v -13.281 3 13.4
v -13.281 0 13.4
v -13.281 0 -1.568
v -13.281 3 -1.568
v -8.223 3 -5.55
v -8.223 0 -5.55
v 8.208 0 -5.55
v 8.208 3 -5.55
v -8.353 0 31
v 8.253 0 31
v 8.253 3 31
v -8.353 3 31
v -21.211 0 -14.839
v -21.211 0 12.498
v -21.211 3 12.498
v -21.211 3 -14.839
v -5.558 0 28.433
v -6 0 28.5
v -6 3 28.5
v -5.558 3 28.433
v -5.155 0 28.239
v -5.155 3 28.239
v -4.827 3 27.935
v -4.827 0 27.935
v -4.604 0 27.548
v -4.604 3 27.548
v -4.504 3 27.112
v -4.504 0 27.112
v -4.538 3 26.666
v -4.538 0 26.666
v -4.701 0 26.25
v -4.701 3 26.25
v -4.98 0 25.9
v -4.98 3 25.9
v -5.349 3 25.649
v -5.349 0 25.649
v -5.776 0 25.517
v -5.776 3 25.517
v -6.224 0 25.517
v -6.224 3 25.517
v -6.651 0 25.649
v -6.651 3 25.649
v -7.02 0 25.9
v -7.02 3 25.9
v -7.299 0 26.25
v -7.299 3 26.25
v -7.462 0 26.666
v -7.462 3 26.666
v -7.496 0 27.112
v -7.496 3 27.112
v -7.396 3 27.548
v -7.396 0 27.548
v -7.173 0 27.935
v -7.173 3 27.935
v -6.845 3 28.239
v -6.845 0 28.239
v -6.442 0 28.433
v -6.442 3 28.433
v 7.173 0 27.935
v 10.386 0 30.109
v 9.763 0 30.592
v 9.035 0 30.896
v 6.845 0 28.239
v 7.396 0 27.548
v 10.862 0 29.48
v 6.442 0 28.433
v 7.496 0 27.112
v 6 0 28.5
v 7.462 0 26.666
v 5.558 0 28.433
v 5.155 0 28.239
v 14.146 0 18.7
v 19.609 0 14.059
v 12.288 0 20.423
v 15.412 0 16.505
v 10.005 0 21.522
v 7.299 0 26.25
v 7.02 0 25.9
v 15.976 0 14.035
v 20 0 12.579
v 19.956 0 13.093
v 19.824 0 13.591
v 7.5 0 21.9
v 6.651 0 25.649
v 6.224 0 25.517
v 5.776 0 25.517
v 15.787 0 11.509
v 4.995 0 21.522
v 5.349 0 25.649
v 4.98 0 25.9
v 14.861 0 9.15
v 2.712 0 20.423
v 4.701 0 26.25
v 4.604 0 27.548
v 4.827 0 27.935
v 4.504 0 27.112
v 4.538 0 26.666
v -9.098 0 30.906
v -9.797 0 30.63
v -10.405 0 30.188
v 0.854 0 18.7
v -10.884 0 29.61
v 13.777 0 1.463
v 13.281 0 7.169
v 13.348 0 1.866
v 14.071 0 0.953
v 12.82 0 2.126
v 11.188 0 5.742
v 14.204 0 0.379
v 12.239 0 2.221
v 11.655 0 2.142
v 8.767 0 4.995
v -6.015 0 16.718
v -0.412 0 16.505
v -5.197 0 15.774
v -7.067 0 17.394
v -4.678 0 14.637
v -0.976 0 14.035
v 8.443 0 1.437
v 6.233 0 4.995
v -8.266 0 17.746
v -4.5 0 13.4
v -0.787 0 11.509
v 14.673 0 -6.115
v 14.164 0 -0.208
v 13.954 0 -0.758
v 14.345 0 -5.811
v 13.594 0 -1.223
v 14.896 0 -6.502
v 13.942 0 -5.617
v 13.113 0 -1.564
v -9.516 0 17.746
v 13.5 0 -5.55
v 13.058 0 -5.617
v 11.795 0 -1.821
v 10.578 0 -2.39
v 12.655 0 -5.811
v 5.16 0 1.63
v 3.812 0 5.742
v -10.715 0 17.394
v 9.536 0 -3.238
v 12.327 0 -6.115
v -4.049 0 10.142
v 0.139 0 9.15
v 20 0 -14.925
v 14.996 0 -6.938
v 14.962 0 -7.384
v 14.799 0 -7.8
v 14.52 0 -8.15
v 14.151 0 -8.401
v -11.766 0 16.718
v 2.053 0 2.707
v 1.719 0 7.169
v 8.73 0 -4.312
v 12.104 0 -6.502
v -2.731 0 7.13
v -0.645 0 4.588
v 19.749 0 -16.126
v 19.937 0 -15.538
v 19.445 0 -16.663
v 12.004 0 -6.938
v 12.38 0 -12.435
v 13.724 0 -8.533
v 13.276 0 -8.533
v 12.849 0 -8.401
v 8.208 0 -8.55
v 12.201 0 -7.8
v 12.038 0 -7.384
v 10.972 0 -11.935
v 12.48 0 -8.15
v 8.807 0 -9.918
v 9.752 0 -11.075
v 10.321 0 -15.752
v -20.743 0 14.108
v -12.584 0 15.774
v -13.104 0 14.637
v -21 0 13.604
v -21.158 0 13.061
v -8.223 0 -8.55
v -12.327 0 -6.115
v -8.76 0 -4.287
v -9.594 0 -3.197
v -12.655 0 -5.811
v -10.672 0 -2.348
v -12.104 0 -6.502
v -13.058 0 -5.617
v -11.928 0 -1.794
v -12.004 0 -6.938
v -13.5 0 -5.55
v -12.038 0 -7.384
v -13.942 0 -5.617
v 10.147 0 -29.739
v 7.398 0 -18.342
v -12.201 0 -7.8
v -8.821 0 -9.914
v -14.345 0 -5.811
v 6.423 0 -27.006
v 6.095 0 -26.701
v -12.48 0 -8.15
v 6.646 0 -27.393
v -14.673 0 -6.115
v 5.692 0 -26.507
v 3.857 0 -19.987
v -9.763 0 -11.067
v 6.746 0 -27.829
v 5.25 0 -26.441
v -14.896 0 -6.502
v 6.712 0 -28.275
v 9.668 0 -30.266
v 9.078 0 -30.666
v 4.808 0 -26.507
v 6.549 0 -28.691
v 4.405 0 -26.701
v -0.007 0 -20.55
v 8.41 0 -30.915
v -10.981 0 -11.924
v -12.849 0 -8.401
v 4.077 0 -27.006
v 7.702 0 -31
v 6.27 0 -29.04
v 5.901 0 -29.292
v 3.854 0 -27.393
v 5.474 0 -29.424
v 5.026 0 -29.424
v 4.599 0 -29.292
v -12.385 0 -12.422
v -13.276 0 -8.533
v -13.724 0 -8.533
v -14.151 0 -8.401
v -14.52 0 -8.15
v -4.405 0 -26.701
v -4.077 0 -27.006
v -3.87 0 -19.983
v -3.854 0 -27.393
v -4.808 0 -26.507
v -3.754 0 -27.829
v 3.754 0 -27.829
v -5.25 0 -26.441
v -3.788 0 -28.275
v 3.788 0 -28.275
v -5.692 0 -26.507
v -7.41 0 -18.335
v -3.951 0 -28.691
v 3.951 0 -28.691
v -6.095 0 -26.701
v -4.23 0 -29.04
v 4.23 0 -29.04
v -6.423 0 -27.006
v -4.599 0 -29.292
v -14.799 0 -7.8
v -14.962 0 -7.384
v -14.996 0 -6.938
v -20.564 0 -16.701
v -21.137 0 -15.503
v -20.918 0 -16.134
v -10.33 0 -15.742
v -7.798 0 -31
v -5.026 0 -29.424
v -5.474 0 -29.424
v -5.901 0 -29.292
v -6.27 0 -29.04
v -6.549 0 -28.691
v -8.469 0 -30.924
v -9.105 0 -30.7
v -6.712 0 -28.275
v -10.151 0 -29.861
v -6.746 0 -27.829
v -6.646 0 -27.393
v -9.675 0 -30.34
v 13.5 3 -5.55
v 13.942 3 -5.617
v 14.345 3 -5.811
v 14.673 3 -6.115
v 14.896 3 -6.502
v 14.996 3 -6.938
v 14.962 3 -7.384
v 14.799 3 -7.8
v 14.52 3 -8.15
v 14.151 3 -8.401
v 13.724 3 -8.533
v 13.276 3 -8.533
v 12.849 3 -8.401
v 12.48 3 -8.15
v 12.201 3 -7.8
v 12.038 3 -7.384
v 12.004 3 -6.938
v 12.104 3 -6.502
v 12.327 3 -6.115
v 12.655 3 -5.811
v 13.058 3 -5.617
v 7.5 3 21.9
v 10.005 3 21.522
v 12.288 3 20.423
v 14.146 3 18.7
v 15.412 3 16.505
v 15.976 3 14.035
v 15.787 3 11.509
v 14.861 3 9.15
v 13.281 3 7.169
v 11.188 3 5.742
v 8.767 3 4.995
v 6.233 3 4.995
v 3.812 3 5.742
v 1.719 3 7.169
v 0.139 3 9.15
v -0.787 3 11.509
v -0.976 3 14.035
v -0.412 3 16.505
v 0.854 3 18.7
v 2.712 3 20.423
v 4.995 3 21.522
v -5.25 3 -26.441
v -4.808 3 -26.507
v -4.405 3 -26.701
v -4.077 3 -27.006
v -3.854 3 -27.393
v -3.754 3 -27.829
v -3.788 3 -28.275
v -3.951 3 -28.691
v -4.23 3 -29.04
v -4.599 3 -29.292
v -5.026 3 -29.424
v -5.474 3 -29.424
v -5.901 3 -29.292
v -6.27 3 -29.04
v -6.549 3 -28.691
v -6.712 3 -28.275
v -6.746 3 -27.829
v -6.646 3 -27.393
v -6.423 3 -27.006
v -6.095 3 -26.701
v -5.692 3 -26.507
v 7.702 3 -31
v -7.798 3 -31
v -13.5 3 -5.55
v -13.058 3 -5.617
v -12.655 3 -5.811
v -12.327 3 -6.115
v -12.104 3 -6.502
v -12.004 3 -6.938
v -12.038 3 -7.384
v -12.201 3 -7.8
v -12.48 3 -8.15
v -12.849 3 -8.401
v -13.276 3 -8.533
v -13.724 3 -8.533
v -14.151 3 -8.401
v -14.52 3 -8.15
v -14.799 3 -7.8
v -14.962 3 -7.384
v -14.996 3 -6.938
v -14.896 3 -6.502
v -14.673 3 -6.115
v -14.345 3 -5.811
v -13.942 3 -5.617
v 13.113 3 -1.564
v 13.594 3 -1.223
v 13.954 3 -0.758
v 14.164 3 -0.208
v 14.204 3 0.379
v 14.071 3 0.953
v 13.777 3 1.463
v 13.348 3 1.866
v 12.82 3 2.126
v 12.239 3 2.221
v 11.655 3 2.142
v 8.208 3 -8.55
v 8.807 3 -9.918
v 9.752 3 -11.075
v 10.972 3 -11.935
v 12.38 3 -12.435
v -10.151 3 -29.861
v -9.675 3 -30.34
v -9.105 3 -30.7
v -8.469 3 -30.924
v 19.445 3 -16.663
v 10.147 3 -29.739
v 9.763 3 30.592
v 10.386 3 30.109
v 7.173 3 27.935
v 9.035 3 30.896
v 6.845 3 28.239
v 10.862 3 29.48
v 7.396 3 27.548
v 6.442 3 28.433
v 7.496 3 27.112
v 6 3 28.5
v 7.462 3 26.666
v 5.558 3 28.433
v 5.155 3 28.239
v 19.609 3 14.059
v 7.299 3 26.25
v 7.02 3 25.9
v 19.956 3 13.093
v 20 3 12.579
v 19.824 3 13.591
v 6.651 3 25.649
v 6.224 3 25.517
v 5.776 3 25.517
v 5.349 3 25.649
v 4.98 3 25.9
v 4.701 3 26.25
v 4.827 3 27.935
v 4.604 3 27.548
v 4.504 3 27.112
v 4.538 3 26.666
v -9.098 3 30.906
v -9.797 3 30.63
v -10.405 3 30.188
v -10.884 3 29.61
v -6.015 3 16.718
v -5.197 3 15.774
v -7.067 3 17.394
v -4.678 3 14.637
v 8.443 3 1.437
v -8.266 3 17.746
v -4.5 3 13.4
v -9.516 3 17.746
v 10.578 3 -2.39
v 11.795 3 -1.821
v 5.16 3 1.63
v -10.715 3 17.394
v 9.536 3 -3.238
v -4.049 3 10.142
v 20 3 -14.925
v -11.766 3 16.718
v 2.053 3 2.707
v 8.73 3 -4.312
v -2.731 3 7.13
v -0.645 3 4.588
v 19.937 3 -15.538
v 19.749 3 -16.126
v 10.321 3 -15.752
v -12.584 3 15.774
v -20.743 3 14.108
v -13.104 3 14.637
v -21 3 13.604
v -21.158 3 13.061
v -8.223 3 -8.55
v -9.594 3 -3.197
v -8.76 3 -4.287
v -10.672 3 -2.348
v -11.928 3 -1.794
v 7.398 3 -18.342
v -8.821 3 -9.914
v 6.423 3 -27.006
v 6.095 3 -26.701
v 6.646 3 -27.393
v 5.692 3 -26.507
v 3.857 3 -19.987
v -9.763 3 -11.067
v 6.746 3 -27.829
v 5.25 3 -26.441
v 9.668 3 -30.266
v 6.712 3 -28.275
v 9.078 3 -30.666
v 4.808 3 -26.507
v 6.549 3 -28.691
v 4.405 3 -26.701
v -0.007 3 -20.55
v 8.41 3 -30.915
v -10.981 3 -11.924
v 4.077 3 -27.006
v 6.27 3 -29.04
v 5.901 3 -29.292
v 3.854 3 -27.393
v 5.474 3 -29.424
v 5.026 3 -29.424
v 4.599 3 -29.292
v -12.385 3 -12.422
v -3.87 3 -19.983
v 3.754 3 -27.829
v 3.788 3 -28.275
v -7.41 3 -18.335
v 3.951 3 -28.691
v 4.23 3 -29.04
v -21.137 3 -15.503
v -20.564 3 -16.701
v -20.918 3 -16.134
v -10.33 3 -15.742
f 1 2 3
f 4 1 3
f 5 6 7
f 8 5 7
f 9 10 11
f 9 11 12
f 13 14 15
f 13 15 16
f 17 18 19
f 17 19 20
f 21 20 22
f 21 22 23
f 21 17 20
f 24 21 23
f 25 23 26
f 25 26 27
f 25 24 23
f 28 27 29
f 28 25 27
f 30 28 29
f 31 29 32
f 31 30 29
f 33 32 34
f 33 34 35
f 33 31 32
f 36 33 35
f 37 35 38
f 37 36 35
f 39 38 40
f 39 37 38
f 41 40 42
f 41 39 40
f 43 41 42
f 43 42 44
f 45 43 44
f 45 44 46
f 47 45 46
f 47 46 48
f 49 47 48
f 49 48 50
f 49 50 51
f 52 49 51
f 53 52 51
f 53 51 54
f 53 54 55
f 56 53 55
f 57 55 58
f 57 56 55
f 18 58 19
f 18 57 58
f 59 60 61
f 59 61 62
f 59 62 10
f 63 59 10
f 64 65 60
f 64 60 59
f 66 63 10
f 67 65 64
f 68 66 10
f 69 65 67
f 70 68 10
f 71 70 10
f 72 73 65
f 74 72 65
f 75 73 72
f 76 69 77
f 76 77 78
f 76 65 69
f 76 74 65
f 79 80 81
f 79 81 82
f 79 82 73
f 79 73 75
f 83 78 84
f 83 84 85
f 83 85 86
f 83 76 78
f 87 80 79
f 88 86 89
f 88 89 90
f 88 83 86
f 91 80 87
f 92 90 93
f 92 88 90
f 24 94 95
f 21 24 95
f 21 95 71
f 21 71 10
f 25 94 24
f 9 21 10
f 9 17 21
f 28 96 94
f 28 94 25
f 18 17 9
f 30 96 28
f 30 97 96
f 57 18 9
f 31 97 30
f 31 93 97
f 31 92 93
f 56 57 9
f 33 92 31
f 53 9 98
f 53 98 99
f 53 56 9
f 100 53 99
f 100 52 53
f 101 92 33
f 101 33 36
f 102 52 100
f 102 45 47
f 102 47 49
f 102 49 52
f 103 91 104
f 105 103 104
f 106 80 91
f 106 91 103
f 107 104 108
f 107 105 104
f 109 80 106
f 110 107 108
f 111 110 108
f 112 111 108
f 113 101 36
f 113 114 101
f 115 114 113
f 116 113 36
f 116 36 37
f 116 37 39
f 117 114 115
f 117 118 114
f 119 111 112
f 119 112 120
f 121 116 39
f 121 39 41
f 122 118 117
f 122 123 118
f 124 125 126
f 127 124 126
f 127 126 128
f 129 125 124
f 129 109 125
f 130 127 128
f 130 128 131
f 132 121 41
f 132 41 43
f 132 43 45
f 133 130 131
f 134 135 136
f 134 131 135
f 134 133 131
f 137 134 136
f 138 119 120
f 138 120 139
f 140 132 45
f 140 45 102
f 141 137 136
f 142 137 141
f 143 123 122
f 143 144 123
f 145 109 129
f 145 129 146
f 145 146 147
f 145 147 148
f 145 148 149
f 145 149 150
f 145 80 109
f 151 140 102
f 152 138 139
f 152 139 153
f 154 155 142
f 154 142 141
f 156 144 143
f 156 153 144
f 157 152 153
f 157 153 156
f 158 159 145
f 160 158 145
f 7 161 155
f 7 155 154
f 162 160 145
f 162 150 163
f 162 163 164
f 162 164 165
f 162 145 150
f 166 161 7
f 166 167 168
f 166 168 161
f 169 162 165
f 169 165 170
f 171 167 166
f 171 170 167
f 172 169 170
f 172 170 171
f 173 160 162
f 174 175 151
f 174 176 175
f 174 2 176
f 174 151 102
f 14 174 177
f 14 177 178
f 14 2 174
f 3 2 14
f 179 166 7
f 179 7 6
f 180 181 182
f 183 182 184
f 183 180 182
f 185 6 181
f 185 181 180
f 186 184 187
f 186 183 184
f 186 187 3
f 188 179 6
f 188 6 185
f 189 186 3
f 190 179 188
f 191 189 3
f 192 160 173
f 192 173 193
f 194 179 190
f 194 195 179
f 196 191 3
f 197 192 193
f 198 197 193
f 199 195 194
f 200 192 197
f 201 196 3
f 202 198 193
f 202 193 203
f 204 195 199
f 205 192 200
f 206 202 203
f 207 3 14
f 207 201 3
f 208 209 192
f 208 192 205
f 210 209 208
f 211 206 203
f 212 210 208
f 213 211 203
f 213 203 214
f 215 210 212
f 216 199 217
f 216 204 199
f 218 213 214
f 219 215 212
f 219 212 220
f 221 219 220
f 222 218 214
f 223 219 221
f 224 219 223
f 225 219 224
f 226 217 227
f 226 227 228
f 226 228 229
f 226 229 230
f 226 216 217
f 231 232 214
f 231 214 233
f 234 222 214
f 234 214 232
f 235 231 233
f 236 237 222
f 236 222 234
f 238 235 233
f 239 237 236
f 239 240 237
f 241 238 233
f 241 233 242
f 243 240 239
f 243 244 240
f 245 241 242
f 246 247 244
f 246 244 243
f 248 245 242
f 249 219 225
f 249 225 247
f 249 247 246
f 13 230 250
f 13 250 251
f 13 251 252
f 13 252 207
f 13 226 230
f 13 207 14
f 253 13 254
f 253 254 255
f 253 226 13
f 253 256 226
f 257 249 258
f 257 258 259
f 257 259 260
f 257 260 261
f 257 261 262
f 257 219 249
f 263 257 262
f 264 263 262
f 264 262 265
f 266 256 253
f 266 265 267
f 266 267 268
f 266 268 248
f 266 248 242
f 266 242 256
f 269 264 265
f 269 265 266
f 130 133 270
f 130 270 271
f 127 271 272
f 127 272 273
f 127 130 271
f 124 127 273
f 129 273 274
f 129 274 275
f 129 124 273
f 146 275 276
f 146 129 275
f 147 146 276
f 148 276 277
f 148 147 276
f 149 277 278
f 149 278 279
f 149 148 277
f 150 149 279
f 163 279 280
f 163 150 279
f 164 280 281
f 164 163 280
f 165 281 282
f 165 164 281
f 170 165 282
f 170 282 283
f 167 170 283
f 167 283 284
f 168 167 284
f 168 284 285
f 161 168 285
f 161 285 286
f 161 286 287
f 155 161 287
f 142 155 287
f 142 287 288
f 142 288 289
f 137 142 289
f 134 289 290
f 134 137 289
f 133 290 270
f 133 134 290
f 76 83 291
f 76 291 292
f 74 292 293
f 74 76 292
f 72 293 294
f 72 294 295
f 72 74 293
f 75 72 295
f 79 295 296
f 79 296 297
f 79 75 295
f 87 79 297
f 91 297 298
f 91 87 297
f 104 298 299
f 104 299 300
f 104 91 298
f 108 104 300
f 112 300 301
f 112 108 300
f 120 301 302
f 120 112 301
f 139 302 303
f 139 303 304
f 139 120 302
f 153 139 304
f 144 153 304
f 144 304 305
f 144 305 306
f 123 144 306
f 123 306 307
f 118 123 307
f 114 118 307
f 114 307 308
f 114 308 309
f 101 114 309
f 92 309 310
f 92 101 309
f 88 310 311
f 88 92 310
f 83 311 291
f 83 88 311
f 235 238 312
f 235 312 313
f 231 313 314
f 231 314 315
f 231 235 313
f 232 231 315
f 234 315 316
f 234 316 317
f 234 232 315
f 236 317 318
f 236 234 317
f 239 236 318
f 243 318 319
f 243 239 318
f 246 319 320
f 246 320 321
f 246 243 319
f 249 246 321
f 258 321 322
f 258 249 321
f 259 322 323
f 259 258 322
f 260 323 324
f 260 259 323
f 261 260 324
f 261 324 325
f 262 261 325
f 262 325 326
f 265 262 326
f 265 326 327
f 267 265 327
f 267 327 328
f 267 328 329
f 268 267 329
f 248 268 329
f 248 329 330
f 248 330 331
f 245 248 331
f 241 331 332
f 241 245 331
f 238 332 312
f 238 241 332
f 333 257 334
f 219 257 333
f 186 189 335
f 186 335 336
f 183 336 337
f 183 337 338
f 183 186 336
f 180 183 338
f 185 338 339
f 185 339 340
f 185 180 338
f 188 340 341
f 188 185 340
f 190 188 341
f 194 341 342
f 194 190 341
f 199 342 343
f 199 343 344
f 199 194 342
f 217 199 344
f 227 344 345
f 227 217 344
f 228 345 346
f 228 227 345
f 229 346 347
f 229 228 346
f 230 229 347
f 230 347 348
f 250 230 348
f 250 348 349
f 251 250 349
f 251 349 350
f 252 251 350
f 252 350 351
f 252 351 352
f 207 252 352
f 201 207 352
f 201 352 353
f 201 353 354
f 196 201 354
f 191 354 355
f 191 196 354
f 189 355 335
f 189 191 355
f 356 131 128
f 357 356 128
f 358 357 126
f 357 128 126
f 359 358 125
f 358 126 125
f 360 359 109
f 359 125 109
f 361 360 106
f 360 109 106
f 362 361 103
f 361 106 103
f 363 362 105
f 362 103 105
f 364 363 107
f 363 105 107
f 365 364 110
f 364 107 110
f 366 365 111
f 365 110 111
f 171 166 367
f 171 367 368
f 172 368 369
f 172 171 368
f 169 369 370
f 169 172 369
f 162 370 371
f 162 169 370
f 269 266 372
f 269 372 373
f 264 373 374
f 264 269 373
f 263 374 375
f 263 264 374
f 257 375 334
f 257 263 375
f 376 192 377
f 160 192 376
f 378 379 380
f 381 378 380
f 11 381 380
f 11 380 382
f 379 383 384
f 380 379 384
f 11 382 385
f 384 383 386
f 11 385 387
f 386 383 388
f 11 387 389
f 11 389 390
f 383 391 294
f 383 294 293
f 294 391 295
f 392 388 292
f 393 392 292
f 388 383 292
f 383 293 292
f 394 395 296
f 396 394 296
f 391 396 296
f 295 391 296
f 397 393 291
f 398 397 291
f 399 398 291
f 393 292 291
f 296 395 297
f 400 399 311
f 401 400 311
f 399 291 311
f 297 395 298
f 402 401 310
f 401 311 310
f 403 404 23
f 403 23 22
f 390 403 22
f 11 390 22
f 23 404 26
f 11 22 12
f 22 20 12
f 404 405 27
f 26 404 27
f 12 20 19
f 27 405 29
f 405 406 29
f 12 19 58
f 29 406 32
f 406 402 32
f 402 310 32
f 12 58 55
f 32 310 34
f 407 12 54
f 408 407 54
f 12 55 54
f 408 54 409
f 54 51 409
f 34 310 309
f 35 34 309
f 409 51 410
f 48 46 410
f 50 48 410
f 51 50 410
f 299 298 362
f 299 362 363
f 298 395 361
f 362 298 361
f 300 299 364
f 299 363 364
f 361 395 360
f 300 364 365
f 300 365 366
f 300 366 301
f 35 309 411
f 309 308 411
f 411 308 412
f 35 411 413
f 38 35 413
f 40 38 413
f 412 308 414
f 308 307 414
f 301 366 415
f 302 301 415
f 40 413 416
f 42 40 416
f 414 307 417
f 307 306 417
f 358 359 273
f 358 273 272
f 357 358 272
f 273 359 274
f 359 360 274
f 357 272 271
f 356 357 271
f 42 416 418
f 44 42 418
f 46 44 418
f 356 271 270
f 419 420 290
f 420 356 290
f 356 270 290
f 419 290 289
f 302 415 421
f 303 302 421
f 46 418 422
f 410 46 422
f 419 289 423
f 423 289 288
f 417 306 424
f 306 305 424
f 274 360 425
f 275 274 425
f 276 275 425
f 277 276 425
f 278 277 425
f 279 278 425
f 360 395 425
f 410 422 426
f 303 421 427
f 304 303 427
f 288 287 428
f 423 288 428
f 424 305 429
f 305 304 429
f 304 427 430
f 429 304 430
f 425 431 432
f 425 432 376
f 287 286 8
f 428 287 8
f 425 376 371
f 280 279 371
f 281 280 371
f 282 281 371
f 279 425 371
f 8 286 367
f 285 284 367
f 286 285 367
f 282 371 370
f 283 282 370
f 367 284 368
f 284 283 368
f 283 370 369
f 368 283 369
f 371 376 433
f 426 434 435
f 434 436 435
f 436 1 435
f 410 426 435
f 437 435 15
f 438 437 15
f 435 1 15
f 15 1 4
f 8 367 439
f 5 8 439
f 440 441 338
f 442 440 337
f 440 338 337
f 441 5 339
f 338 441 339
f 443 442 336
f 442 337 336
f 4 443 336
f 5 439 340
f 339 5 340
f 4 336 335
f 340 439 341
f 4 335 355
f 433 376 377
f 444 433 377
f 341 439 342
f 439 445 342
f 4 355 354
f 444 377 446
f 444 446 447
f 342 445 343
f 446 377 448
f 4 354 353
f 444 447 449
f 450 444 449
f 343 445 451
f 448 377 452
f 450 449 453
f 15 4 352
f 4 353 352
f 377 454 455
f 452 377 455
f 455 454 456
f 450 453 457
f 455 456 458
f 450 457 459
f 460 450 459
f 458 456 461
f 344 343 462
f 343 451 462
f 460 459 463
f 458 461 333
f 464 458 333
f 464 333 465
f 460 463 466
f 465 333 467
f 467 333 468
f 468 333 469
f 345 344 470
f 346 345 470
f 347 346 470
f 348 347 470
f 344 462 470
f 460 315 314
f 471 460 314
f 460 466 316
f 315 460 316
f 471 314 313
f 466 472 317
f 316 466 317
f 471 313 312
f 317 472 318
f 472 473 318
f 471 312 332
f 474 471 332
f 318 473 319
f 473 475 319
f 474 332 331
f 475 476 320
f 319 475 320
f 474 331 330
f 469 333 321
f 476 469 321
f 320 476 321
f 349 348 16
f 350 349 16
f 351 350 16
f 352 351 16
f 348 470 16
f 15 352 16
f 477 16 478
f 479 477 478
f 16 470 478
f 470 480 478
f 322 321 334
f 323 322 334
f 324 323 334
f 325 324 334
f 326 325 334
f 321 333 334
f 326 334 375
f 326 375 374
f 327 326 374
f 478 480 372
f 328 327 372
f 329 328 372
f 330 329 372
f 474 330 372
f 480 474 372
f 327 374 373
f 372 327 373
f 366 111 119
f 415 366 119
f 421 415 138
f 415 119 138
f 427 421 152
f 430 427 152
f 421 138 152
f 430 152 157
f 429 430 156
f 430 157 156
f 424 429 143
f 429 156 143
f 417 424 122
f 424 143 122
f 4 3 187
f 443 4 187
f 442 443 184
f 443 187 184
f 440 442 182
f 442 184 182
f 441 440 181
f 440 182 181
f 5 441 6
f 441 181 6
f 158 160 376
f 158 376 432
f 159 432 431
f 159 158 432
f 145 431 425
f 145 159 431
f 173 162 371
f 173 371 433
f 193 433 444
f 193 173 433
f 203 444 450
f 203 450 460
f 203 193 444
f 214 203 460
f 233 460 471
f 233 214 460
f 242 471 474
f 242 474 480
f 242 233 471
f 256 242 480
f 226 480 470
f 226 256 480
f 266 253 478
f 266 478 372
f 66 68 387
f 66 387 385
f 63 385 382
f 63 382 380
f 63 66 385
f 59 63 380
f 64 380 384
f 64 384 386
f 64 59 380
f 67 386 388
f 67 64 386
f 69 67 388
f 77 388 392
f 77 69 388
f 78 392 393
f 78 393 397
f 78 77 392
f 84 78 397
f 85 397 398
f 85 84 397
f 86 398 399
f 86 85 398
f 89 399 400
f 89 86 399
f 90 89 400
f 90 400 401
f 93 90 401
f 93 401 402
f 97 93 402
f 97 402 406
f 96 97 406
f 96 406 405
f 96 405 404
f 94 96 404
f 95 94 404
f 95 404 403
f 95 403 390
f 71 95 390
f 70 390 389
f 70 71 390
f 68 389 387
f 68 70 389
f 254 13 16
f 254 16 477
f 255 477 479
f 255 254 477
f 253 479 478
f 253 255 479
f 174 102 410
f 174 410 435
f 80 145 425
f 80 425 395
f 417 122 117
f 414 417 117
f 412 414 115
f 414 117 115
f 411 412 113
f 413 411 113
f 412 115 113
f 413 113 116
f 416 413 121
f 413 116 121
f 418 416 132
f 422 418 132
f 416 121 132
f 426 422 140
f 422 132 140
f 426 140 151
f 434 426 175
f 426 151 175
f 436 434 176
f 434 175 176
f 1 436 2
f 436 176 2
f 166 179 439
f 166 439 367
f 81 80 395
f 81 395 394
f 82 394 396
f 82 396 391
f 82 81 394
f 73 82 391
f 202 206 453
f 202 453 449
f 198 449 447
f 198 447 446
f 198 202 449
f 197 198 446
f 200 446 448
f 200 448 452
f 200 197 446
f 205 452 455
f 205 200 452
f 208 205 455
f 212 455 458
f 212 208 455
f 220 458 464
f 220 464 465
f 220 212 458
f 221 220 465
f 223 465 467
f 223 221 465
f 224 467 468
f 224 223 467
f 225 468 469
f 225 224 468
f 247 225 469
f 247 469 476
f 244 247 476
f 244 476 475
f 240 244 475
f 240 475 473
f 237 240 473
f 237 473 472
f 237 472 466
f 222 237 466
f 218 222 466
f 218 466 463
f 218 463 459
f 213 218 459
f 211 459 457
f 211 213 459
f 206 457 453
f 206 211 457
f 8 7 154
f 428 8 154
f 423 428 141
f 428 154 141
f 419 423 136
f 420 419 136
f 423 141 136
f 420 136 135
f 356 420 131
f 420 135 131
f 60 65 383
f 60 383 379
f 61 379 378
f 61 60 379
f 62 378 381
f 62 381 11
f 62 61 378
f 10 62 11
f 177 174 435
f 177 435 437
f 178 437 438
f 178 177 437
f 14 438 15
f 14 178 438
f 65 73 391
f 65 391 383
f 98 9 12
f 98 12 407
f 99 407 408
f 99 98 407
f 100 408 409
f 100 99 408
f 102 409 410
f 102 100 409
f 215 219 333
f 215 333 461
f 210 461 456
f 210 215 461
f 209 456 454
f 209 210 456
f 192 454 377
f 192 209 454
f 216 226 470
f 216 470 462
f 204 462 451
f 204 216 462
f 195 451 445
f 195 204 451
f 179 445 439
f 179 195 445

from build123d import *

# Parameters (mm, degrees)
SKETCH1_R          = 8.5
SKETCH1_R_2        = 1.5
BASE_FLANGE1_DEPTH = 3


# Sheet-metal steps are written as plain solids
with BuildPart() as part:
    # Sketch1 → Base-Flange1 (new body)
    with BuildSketch(Plane(origin=(0, 0, 0), x_dir=(1, 0, 0), z_dir=(0, 1, 0))):
        with BuildLine():
            Line((19.609421573, -14.059417906), (10.862109445, -29.480175346))
            ThreePointArc((10.862109445, -29.480175346), (9.762567662, -30.59234701), (8.252687872, -31))
            Line((8.252687872, -31), (-8.352599575, -31))
            ThreePointArc((-8.352599575, -31), (-9.796606082, -30.629609326), (-10.884048227, -29.609896806))
            Line((-10.884048227, -29.609896806), (-20.742852548, -14.107625594))
            ThreePointArc((-20.742852548, -14.107625594), (-21.091885276, -13.336076582), (-21.211403896, -12.497728788))
            Line((-21.211403896, -12.497728788), (-21.211403896, 14.839305313))
            ThreePointArc((-21.211403896, 14.839305313), (-21.044943633, 15.824725306), (-20.564035521, 16.700789784))
            Line((-20.564035521, 16.700789784), (-10.150833328, 29.861484472))
            ThreePointArc((-10.150833328, 29.861484472), (-9.105019706, 30.700412322), (-7.798201703, 31))
            Line((-7.798201703, 31), (7.702138241, 31))
            ThreePointArc((7.702138241, 31), (9.077698333, 30.666052219), (10.147014932, 29.738556288))
            Line((10.147014932, 29.738556288), (19.444876691, 16.663267527))
            ThreePointArc((19.444876691, 16.663267527), (19.857851472, 15.837226972), (20, 14.924711239))
            Line((20, 14.924711239), (20, -12.57924256))
            ThreePointArc((20, -12.57924256), (19.900712388, -13.344662472), (19.609421573, -14.059417906))
        make_face()
        with Locations(Location((7.5, -13.4, 0), (0, 0, 270))):
            Circle(SKETCH1_R, mode=Mode.SUBTRACT)
        with Locations(Location((6, -27, 0), (0, 0, 270))):
            Circle(SKETCH1_R_2, mode=Mode.SUBTRACT)
        with Locations(Location((-6, -27, 0), (0, 0, 270))):
            Circle(SKETCH1_R_2, mode=Mode.SUBTRACT)
        with Locations(Location((5.25, 27.940782939, 0), (0, 0, 270))):
            Circle(SKETCH1_R_2, mode=Mode.SUBTRACT)
        with Locations(Location((-5.25, 27.940782939, 0), (0, 0, 270))):
            Circle(SKETCH1_R_2, mode=Mode.SUBTRACT)
        with Locations(Location((13.5, 7.05, 0), (0, 0, 270))):
            Circle(SKETCH1_R_2, mode=Mode.SUBTRACT)
        with Locations(Location((-13.5, 7.05, 0), (0, 0, 270))):
            Circle(SKETCH1_R_2, mode=Mode.SUBTRACT)
        with BuildLine():
            Line((-13.281403896, 0), (-13.281403896, 1.567980996))
            ThreePointArc((-13.281403896, 1.567980996), (-10.106558233, 2.738982767), (-8.222660082, 5.55))
            Line((-8.222660082, 5.55), (8.208497378, 5.55))
            ThreePointArc((8.208497378, 5.55), (10.031018679, 2.781959631), (13.113110627, 1.563624456))
            ThreePointArc((13.113110627, 1.563624456), (14.07117407, -0.953003234), (11.655254401, -2.142386538))
            ThreePointArc((11.655254401, -2.142386538), (0.639353267, -3.554619032), (-4.5, -13.4))
            ThreePointArc((-4.5, -13.4), (-8.890701948, -17.790701948), (-13.281403896, -13.4))
            Line((-13.281403896, -13.4), (-13.281403896, 0))
        make_face(mode=Mode.SUBTRACT)
        with BuildLine():
            Line((-8.222660082, 8.55), (8.208497378, 8.55))
            ThreePointArc((8.208497378, 8.55), (9.751572067, 11.074833914), (12.37962963, 12.434679214))
            ThreePointArc((12.37962963, 12.434679214), (-0.006957749, 20.549998207), (-12.385173459, 12.42191571))
            ThreePointArc((-12.385173459, 12.42191571), (-9.763306163, 11.067142739), (-8.222660082, 8.55))
        make_face(mode=Mode.SUBTRACT)
    extrude(amount=BASE_FLANGE1_DEPTH)


solid = part.part
